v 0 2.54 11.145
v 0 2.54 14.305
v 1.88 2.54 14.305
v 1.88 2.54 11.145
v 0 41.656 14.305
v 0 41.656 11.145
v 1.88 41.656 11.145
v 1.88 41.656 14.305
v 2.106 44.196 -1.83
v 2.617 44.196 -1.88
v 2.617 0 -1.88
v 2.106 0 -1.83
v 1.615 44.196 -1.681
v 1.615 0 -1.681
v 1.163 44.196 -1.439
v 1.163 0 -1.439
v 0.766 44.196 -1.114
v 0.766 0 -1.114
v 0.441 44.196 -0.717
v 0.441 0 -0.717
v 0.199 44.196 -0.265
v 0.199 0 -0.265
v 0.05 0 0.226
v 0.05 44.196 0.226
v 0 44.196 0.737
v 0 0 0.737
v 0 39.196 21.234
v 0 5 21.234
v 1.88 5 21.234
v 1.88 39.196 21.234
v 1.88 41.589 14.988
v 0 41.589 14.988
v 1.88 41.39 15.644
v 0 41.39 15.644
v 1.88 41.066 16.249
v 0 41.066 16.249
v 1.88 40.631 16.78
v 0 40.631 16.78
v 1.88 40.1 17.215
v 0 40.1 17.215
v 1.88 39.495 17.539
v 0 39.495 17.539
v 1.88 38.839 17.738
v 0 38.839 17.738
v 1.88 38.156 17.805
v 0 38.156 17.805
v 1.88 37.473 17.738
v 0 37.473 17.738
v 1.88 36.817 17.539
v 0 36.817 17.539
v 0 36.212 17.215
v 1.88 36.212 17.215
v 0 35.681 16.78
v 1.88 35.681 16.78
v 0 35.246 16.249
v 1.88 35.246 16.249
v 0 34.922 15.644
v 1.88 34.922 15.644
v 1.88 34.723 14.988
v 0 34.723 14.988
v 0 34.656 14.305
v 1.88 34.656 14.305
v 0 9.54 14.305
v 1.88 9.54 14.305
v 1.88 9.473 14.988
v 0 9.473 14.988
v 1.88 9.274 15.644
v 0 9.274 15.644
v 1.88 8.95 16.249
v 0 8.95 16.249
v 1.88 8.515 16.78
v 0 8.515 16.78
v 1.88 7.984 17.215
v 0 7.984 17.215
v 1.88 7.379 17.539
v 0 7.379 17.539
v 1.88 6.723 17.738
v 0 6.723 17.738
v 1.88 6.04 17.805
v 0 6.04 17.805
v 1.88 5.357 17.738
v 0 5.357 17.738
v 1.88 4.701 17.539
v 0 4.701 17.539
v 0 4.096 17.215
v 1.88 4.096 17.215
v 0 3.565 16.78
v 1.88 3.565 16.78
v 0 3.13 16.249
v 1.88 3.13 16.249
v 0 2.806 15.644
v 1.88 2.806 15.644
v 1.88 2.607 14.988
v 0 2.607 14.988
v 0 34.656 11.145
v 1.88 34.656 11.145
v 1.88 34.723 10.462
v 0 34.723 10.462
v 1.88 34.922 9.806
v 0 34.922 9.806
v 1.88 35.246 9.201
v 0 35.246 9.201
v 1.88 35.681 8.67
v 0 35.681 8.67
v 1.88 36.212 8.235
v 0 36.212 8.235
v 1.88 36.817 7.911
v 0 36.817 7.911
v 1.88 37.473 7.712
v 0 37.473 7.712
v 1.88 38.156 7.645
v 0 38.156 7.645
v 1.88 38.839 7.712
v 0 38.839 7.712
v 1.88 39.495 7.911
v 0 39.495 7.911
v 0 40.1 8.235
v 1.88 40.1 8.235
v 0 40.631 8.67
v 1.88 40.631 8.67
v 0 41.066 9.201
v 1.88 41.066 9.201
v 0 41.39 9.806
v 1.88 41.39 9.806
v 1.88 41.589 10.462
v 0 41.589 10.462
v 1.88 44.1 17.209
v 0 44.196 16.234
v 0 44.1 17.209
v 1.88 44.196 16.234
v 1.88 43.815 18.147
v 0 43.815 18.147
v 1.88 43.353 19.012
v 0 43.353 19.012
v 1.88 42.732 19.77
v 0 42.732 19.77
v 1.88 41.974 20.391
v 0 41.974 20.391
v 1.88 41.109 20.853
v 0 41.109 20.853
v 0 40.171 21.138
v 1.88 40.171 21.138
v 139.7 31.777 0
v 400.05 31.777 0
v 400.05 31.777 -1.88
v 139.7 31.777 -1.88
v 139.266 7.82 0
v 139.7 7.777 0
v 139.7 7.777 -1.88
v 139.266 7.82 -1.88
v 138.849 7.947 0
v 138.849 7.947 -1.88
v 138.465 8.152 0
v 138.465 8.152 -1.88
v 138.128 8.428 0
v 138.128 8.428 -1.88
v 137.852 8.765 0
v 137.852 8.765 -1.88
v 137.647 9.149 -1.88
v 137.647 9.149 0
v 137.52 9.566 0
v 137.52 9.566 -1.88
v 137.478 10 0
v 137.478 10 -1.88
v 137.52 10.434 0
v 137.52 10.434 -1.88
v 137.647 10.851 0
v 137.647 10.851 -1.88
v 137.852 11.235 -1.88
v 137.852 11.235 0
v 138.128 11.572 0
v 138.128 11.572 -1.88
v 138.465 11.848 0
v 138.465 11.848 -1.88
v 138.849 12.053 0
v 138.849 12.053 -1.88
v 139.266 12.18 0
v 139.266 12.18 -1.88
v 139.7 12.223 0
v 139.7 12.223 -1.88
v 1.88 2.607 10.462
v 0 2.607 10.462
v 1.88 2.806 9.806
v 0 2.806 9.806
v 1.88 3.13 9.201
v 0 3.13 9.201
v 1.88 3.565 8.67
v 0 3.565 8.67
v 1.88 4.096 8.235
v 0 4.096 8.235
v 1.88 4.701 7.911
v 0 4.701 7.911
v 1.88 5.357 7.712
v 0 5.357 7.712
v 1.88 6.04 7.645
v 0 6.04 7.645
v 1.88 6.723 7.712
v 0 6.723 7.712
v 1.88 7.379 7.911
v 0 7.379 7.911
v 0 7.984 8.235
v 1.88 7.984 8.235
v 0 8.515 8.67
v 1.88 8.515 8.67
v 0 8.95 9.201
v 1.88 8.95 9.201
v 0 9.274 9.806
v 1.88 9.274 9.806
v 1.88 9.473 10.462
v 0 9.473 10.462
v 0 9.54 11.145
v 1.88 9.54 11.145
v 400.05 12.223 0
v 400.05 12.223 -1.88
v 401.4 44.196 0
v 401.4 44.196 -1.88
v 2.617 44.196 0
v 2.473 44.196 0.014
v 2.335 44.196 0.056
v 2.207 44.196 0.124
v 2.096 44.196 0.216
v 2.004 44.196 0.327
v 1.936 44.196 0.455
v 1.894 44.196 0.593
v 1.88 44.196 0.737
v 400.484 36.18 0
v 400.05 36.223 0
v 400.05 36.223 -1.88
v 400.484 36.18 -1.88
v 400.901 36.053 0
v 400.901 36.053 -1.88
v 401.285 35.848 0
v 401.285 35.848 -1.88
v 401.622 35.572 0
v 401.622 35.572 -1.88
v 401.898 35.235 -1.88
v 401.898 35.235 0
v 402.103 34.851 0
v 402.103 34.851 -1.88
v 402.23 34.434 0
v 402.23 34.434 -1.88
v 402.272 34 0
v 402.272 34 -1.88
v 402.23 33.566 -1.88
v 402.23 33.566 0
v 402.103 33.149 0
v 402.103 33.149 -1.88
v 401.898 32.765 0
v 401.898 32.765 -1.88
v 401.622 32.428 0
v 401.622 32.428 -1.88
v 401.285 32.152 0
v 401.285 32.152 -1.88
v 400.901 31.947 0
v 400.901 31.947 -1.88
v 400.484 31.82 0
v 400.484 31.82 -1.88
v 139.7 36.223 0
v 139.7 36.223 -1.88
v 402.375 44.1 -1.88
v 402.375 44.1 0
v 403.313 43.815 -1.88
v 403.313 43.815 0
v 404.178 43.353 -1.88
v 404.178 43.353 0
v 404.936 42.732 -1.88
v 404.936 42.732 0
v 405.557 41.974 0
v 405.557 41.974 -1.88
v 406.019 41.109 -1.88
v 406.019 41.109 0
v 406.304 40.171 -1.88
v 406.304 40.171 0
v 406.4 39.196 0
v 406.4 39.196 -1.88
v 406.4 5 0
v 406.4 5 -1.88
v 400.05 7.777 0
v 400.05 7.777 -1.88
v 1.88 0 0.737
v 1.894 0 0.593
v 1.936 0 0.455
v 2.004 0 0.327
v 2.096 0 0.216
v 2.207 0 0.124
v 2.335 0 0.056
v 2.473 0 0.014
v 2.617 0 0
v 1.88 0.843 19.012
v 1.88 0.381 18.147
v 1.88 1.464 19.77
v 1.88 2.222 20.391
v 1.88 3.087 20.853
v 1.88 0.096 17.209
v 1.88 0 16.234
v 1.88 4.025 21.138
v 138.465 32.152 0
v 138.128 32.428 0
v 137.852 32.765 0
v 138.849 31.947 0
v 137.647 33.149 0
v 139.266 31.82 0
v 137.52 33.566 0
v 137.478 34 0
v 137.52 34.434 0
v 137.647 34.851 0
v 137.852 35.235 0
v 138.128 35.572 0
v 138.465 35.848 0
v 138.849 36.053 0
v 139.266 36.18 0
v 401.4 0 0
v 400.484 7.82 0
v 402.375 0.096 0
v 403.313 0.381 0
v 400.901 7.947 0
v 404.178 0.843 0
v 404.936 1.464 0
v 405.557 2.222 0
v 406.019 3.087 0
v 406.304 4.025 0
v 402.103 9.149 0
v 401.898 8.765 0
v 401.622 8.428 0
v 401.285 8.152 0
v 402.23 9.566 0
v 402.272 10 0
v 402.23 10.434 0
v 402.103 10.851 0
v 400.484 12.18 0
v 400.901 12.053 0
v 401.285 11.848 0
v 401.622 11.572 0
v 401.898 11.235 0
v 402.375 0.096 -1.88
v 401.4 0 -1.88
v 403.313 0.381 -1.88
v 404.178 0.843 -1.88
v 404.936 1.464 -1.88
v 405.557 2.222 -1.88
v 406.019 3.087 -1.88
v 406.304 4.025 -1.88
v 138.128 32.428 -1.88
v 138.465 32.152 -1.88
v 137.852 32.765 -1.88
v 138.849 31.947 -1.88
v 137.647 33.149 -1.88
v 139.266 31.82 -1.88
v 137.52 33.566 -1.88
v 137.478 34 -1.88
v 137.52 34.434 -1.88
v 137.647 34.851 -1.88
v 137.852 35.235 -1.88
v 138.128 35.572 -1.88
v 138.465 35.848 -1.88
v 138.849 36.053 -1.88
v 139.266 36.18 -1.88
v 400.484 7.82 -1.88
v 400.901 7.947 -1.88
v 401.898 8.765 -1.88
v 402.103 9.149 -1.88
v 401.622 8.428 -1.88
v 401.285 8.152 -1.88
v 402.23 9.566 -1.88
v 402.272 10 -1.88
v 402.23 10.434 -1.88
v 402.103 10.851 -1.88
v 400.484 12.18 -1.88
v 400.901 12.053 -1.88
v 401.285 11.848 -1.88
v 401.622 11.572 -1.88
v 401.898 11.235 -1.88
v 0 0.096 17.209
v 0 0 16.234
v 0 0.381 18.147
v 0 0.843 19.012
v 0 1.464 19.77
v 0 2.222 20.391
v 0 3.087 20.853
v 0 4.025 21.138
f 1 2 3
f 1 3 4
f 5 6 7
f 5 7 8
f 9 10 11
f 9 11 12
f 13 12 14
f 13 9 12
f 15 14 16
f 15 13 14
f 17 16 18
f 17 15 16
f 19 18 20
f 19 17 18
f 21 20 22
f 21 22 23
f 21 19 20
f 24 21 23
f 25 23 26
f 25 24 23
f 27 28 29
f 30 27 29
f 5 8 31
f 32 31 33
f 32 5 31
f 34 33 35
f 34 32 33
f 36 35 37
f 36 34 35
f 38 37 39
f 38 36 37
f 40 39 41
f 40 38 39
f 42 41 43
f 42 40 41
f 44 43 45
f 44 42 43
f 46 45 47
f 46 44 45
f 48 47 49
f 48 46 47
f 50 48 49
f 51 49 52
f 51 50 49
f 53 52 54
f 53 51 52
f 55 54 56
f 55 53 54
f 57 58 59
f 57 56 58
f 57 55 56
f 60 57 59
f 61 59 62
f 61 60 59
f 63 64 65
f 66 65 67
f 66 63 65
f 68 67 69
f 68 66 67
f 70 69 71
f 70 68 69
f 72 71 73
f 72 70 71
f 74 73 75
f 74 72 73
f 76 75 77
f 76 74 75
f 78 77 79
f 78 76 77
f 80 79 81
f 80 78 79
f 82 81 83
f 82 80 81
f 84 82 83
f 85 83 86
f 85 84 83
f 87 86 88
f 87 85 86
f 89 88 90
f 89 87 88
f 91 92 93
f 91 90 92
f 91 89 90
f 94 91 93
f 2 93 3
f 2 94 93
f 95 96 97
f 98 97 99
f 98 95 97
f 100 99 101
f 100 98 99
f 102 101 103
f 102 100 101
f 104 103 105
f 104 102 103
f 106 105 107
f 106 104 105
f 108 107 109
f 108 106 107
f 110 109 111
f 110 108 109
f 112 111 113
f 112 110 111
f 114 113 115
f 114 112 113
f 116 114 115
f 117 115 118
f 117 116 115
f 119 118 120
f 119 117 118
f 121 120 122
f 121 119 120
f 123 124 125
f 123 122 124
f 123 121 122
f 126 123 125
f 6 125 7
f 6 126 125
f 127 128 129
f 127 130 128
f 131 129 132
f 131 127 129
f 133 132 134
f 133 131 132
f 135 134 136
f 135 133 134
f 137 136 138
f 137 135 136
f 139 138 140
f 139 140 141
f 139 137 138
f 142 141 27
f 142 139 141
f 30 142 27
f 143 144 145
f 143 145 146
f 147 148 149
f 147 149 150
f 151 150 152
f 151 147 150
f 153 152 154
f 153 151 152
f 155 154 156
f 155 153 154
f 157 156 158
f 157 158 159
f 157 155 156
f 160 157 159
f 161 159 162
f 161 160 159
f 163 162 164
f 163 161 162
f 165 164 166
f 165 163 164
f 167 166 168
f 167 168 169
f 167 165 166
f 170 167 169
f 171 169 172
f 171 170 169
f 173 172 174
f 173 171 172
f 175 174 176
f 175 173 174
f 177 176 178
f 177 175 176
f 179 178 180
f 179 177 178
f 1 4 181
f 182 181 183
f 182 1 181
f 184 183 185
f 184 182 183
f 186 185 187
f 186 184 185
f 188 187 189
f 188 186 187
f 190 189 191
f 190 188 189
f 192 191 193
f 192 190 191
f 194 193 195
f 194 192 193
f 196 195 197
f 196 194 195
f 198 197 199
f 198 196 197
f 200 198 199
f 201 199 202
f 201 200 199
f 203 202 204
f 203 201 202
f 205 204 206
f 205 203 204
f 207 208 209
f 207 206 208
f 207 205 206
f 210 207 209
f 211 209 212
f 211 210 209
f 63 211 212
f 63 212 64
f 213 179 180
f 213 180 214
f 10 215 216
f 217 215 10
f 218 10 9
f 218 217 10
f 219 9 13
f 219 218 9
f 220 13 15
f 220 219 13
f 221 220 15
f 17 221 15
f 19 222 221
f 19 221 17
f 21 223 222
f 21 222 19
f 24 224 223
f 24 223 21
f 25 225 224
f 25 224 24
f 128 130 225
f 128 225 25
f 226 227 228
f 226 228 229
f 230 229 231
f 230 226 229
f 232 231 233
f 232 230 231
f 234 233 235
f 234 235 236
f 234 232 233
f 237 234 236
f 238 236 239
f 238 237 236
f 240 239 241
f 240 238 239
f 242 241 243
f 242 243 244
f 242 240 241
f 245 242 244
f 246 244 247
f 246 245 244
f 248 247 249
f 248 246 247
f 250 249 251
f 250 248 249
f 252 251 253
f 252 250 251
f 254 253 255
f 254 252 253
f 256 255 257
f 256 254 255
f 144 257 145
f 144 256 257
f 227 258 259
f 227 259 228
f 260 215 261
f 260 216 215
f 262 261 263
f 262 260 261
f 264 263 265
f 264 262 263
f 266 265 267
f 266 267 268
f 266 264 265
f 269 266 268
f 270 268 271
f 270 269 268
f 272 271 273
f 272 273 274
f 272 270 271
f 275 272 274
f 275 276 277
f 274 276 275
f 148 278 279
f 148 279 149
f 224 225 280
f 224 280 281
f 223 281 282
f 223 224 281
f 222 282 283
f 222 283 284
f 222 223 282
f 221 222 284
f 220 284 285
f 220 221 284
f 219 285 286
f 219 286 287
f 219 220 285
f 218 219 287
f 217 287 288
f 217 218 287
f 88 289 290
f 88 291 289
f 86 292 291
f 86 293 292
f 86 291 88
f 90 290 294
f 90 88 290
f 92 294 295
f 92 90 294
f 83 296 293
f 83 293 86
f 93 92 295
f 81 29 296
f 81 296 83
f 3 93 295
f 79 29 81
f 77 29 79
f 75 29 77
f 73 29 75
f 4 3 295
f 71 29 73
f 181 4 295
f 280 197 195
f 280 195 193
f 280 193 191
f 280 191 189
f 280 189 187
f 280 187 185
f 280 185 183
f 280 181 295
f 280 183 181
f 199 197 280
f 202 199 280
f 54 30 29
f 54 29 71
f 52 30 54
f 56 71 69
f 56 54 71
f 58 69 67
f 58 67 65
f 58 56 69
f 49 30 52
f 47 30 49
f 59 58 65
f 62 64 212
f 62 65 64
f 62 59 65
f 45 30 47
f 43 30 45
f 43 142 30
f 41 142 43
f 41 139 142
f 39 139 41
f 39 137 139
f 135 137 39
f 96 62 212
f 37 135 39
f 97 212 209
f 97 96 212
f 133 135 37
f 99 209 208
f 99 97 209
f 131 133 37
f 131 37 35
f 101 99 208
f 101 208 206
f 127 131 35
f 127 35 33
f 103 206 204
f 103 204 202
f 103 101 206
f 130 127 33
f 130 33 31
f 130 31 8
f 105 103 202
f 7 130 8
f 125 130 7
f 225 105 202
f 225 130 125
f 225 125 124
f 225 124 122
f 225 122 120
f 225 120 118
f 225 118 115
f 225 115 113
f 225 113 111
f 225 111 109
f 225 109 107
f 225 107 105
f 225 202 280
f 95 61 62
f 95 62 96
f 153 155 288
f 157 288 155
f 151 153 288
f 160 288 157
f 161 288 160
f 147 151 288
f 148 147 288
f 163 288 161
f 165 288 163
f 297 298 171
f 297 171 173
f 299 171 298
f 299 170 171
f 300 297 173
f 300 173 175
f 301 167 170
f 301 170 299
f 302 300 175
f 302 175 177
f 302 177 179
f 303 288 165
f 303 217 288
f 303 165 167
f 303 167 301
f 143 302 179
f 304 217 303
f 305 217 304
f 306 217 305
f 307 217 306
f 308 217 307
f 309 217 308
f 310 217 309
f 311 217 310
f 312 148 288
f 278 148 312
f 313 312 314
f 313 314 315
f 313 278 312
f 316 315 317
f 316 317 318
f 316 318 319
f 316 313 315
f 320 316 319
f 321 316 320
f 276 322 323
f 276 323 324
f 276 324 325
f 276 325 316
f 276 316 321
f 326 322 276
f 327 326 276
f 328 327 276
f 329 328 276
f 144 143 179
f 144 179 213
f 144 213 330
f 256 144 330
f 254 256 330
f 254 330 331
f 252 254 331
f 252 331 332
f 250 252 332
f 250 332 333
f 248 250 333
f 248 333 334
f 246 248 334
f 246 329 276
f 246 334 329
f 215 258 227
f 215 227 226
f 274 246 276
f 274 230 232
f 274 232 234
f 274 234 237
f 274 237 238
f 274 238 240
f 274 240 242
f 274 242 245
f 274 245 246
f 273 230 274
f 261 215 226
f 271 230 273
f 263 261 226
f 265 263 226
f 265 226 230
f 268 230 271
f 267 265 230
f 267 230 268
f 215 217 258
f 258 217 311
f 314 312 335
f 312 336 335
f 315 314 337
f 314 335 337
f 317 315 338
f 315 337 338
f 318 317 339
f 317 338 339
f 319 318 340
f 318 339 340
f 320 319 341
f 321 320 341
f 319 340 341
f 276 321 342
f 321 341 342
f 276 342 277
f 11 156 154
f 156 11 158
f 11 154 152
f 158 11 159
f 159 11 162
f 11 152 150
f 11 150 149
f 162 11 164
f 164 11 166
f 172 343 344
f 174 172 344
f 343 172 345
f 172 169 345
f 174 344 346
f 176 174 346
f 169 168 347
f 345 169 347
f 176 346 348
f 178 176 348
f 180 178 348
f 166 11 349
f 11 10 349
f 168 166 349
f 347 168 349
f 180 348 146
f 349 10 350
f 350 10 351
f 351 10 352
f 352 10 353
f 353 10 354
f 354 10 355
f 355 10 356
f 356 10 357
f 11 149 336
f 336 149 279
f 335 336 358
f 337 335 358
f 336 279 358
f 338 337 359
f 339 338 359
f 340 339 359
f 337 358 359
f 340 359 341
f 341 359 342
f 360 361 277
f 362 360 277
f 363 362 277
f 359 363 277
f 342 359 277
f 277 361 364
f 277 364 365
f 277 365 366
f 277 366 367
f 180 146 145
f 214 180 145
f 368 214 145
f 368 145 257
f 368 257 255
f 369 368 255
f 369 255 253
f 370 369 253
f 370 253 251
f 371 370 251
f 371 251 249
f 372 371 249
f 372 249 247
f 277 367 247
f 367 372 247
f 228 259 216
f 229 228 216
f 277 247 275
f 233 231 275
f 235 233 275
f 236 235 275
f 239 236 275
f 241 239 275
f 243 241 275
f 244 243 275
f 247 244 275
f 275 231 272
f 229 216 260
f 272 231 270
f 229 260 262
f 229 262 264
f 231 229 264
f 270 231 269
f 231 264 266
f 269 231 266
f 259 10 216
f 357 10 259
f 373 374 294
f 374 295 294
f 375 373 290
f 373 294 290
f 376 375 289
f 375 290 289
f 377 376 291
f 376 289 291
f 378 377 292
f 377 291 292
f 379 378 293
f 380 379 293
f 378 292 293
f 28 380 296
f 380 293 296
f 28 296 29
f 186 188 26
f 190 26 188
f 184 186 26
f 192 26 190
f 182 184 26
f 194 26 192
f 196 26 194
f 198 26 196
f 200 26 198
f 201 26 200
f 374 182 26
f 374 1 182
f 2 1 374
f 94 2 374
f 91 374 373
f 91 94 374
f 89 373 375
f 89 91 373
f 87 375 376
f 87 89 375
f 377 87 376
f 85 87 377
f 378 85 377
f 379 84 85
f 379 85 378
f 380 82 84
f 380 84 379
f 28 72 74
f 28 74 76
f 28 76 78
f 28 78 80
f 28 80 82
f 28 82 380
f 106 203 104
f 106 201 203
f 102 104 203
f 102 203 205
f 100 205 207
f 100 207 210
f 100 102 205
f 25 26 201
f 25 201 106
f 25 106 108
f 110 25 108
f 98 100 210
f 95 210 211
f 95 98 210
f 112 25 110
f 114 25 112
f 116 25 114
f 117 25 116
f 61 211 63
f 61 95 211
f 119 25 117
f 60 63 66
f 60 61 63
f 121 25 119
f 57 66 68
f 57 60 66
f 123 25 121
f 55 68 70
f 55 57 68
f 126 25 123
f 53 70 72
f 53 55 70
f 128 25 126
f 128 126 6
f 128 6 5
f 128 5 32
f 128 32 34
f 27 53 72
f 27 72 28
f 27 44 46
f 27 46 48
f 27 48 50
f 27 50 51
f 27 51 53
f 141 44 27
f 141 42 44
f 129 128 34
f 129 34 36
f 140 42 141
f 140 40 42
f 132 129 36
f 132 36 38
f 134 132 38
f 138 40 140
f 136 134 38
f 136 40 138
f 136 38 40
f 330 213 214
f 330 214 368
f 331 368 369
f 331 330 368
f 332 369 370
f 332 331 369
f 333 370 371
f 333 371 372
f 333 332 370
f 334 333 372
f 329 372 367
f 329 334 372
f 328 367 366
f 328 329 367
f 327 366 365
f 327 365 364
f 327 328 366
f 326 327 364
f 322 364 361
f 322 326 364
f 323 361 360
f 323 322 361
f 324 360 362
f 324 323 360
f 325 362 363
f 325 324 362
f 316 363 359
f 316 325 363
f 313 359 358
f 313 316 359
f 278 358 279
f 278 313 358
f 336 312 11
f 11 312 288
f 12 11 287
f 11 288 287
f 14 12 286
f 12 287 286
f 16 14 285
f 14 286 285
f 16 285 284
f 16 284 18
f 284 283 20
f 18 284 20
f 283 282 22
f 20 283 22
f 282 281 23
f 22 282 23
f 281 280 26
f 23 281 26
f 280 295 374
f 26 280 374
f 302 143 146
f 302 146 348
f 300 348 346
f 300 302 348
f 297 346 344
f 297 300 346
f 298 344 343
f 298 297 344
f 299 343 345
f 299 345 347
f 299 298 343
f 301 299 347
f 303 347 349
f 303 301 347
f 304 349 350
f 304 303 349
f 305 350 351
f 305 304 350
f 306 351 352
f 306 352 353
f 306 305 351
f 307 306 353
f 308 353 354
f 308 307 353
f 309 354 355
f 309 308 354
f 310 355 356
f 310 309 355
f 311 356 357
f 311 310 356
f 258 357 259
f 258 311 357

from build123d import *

# Parameters (mm, degrees)
SKETCH1_W                    = 406.4
SKETCH1_H                    = 44.196
BASE_FLANGE1_DEPTH           = 1.88
EDGE_FLANGE1_STRIP_W         = 8.9932
EDGE_FLANGE1_STRIP_H         = 1.88
EDGE_FLANGE1_STRIP_CUT_DEPTH = 44.196
EDGE_FLANGE1_DEPTH           = 44.196
CUT_EXTRUDE1_REACH           = 411.347
FILLET1_R                    = 5


# Sheet-metal steps are written as plain solids
with BuildPart() as part:
    # Sketch1 → Base-Flange1 (new body)
    with BuildSketch(Plane.XY):
        with Locations((203.2, 22.098)):
            Rectangle(SKETCH1_W, SKETCH1_H)
        with BuildLine():
            Line((139.7, 36.2225), (400.05, 36.2225))
            ThreePointArc((400.05, 36.2225), (402.2725, 34), (400.05, 31.7775))
            Line((400.05, 31.7775), (139.7, 31.7775))
            ThreePointArc((139.7, 31.7775), (137.4775, 34), (139.7, 36.2225))
        make_face(mode=Mode.SUBTRACT)
        with BuildLine():
            Line((139.7, 12.2225), (400.05, 12.2225))
            ThreePointArc((400.05, 12.2225), (402.2725, 10), (400.05, 7.7775))
            Line((400.05, 7.7775), (139.7, 7.7775))
            ThreePointArc((139.7, 7.7775), (137.4775, 10), (139.7, 12.2225))
        make_face(mode=Mode.SUBTRACT)
    extrude(amount=-BASE_FLANGE1_DEPTH)

    # Edge-Flange1 strip (across the edge) → Edge-Flange1 strip cut (cut)
    with BuildSketch(Plane.XZ.offset(-44.196)):
        with Locations((-1.88, -0.94)):
            Rectangle(EDGE_FLANGE1_STRIP_W, EDGE_FLANGE1_STRIP_H)
    extrude(amount=EDGE_FLANGE1_STRIP_CUT_DEPTH, mode=Mode.SUBTRACT)

    # Edge-Flange1 section (across the edge) → Edge-Flange1 (add)
    with BuildSketch(Plane.XZ.offset(-44.196)):
        with BuildLine():
            Line((0, 0.7366), (0, 21.234))
            Line((0, 21.234), (1.88, 21.234))
            Line((1.88, 21.234), (1.88, 0.7366))
            ThreePointArc((1.88, 0.7366), (2.095745145, 0.215745145), (2.6166, 0))
            Line((2.6166, 0), (2.6166, -1.88))
            ThreePointArc((2.6166, -1.88), (0.766384396, -1.113615604), (0, 0.7366))
        make_face()
    extrude(amount=EDGE_FLANGE1_DEPTH)

    # Sketch9 → Cut-Extrude1 (cut, up to next)
    with BuildSketch(Plane.ZY, mode=Mode.PRIVATE) as cut_extrude1_sk1:
        with BuildLine():
            Line((11.145, 41.656), (14.305, 41.656))
            ThreePointArc((14.305, 41.656), (17.805, 38.156), (14.305, 34.656))
            Line((14.305, 34.656), (11.145, 34.656))
            ThreePointArc((11.145, 34.656), (7.645, 38.156), (11.145, 41.656))
        make_face()
    cut_extrude1_tool1 = extrude(cut_extrude1_sk1.sketch, amount=-CUT_EXTRUDE1_REACH, mode=Mode.PRIVATE) & part.part
    # Sketch9 → Cut-Extrude1 (cut, up to next)
    with BuildSketch(Plane.ZY, mode=Mode.PRIVATE) as cut_extrude1_sk2:
        with BuildLine():
            Line((11.145, 9.54), (14.305, 9.54))
            ThreePointArc((14.305, 9.54), (17.805, 6.04), (14.305, 2.54))
            Line((14.305, 2.54), (11.145, 2.54))
            ThreePointArc((11.145, 2.54), (7.645, 6.04), (11.145, 9.54))
        make_face()
    cut_extrude1_tool2 = extrude(cut_extrude1_sk2.sketch, amount=-CUT_EXTRUDE1_REACH, mode=Mode.PRIVATE) & part.part
    add(cut_extrude1_tool1.solids().sort_by_distance((0, 38.156, 12.725))[0], mode=Mode.SUBTRACT)
    add(cut_extrude1_tool2.solids().sort_by_distance((0, 6.04, 12.725))[0], mode=Mode.SUBTRACT)

    # Fillet1
    fillet1_edges = [part.edges().sort_by_distance(p)[0] for p in [
        (0.94, 44.196, 21.234),
        (0.94, 0, 21.234),
        (406.4, 44.196, -0.94),
        (406.4, 0, -0.94),
    ]]
    fillet(fillet1_edges, radius=FILLET1_R)


solid = part.part
